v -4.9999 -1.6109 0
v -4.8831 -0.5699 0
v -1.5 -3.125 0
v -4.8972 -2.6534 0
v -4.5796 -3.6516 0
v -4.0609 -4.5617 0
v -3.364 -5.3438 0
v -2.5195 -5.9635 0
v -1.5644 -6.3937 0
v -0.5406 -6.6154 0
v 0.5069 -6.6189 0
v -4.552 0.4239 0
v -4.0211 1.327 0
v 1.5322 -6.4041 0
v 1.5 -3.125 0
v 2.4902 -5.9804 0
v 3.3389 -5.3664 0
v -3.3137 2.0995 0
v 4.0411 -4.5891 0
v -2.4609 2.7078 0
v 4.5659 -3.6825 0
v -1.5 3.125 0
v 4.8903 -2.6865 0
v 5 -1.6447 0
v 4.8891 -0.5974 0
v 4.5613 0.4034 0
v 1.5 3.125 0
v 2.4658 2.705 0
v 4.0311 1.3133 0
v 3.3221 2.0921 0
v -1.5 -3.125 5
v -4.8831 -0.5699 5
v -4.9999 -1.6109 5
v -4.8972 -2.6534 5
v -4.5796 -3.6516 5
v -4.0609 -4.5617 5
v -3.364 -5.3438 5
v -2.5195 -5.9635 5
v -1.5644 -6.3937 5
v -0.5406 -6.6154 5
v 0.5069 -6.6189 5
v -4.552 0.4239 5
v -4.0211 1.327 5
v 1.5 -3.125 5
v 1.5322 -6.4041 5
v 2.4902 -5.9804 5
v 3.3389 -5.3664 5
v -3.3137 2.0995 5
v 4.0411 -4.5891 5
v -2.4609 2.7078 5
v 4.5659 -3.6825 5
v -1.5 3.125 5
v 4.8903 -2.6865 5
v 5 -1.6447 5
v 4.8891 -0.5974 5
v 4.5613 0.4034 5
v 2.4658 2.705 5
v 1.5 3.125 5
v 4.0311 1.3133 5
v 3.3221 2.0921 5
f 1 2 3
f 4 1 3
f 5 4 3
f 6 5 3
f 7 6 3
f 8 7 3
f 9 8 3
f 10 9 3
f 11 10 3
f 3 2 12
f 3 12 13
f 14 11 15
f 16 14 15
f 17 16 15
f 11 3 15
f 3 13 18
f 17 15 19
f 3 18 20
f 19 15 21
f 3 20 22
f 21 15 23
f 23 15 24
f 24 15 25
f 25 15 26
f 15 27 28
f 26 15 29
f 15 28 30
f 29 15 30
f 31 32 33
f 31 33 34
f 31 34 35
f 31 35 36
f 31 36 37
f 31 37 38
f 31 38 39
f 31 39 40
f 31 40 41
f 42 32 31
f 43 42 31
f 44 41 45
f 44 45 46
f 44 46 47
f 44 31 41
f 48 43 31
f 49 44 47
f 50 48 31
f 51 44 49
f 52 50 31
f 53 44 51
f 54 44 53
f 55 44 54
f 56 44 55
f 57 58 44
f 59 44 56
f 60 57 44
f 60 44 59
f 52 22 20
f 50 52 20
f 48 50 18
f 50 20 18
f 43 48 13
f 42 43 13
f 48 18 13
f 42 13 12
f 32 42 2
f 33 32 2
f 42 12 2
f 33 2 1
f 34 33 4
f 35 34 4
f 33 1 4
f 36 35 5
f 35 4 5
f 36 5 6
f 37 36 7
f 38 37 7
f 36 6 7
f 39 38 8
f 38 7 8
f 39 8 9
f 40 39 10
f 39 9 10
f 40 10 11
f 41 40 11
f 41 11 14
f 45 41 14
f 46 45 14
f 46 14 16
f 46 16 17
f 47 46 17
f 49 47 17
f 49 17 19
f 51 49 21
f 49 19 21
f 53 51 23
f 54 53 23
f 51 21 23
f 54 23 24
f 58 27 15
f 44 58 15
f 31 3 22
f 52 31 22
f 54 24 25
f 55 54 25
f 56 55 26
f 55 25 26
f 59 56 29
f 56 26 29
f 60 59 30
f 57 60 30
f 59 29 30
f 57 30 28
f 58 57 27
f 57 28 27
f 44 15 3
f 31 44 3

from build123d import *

# Parameters (mm, degrees)
BOSS_EXTRUDE1_DEPTH = 5


with BuildPart() as part:
    # Sketch1 → Boss-Extrude1 (new body)
    with BuildSketch(Plane.XY):
        with BuildLine():
            Line((1.5, 3.125), (1.5, -3.125))
            Line((1.5, -3.125), (-1.5, -3.125))
            Line((-1.5, -3.125), (-1.5, 3.125))
            ThreePointArc((-1.5, 3.125), (-2.958039892, -5.675824881), (5, -1.644696007))
            ThreePointArc((5, -1.644696007), (4.031128874, 1.313343884), (1.5, 3.125))
        make_face()
    extrude(amount=BOSS_EXTRUDE1_DEPTH)


solid = part.part
